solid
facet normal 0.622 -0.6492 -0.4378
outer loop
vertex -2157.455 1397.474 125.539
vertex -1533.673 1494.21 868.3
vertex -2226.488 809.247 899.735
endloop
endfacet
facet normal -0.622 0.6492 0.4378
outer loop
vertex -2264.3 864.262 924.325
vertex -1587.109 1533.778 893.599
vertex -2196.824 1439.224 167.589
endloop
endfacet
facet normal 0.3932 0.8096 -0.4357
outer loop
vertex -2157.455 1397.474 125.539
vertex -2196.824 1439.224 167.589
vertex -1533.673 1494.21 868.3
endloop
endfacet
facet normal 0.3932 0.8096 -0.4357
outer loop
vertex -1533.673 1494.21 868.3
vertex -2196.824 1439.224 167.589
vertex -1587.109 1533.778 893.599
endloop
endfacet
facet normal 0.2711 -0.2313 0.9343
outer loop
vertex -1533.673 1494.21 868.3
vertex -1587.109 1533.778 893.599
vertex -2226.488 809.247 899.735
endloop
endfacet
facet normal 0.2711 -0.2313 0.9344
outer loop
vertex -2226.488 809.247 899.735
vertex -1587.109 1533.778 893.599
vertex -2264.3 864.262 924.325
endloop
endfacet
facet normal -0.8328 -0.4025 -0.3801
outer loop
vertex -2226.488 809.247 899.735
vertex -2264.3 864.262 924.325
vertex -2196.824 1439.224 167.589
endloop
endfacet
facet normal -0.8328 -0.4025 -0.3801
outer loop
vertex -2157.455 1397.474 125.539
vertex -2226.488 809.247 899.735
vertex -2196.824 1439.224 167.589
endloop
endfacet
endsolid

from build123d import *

# Parameters (mm, degrees)
BOSS_EXTRUDE1_DEPTH = 70
CHAMFER1_SIZE2      = 6.345862846
CHAMFER1_SIZE       = 70
CHAMFER2_SIZE2      = 6.345862846
CHAMFER2_SIZE       = 70
CHAMFER3_SIZE2      = 6.345862846
CHAMFER3_SIZE       = 70


with BuildPart() as part:
    # Sketch1 → Boss-Extrude1 (new body)
    with BuildSketch(Plane(origin=(-1433.119965314, 1495.839685025, 1008.740075281), x_dir=(0.7358390900822849, 0.2934391216969858, 0.6102739674642665), z_dir=(-0.6219840117130521, 0.6492048053824052, 0.43780019397178355))):
        Polygon((-160.176034679, 64.657883799), (-851.787483691, -622.240132354), (-1100.852890984, 320.161960115), align=None)
    extrude(amount=BOSS_EXTRUDE1_DEPTH)

    # Chamfer1
    chamfer1_edges = [part.edges().sort_by_distance(p)[0] for p in [
        (-1923.619381658, 1197.172763007, 914.663383892),
    ]]
    chamfer1_side = [part.faces().sort_by_distance(p)[0] for p in [
        (-1923.540441153, 1197.090367714, 914.607819493),
    ]]
    chamfer(chamfer1_edges, length=CHAMFER1_SIZE - 0.0001, length2=CHAMFER1_SIZE2 - 0.0001, reference=chamfer1_side[0])  # a hair under: the kernel refuses the full size

    # Chamfer2
    chamfer2_edges = [part.edges().sort_by_distance(p)[0] for p in [
        (-1891.447617283, 1490.922853817, 524.774000982),
    ]]
    chamfer2_side = [part.faces().sort_by_distance(p)[0] for p in [
        (-1891.368676779, 1490.840458524, 524.718436582),
    ]]
    chamfer(chamfer2_edges, length=CHAMFER2_SIZE - 0.0001, length2=CHAMFER2_SIZE2 - 0.0001, reference=chamfer2_side[0])  # a hair under: the kernel refuses the full size

    # Chamfer3
    chamfer3_edges = [part.edges().sort_by_distance(p)[0] for p in [
        (-2235.510357018, 1148.804652005, 543.283032262),
    ]]
    chamfer3_side = [part.faces().sort_by_distance(p)[0] for p in [
        (-2235.431416513, 1148.722256712, 543.227467862),
    ]]
    chamfer(chamfer3_edges, length=CHAMFER3_SIZE - 0.0001, length2=CHAMFER3_SIZE2 - 0.0001, reference=chamfer3_side[0])  # a hair under: the kernel refuses the full size


solid = part.part
